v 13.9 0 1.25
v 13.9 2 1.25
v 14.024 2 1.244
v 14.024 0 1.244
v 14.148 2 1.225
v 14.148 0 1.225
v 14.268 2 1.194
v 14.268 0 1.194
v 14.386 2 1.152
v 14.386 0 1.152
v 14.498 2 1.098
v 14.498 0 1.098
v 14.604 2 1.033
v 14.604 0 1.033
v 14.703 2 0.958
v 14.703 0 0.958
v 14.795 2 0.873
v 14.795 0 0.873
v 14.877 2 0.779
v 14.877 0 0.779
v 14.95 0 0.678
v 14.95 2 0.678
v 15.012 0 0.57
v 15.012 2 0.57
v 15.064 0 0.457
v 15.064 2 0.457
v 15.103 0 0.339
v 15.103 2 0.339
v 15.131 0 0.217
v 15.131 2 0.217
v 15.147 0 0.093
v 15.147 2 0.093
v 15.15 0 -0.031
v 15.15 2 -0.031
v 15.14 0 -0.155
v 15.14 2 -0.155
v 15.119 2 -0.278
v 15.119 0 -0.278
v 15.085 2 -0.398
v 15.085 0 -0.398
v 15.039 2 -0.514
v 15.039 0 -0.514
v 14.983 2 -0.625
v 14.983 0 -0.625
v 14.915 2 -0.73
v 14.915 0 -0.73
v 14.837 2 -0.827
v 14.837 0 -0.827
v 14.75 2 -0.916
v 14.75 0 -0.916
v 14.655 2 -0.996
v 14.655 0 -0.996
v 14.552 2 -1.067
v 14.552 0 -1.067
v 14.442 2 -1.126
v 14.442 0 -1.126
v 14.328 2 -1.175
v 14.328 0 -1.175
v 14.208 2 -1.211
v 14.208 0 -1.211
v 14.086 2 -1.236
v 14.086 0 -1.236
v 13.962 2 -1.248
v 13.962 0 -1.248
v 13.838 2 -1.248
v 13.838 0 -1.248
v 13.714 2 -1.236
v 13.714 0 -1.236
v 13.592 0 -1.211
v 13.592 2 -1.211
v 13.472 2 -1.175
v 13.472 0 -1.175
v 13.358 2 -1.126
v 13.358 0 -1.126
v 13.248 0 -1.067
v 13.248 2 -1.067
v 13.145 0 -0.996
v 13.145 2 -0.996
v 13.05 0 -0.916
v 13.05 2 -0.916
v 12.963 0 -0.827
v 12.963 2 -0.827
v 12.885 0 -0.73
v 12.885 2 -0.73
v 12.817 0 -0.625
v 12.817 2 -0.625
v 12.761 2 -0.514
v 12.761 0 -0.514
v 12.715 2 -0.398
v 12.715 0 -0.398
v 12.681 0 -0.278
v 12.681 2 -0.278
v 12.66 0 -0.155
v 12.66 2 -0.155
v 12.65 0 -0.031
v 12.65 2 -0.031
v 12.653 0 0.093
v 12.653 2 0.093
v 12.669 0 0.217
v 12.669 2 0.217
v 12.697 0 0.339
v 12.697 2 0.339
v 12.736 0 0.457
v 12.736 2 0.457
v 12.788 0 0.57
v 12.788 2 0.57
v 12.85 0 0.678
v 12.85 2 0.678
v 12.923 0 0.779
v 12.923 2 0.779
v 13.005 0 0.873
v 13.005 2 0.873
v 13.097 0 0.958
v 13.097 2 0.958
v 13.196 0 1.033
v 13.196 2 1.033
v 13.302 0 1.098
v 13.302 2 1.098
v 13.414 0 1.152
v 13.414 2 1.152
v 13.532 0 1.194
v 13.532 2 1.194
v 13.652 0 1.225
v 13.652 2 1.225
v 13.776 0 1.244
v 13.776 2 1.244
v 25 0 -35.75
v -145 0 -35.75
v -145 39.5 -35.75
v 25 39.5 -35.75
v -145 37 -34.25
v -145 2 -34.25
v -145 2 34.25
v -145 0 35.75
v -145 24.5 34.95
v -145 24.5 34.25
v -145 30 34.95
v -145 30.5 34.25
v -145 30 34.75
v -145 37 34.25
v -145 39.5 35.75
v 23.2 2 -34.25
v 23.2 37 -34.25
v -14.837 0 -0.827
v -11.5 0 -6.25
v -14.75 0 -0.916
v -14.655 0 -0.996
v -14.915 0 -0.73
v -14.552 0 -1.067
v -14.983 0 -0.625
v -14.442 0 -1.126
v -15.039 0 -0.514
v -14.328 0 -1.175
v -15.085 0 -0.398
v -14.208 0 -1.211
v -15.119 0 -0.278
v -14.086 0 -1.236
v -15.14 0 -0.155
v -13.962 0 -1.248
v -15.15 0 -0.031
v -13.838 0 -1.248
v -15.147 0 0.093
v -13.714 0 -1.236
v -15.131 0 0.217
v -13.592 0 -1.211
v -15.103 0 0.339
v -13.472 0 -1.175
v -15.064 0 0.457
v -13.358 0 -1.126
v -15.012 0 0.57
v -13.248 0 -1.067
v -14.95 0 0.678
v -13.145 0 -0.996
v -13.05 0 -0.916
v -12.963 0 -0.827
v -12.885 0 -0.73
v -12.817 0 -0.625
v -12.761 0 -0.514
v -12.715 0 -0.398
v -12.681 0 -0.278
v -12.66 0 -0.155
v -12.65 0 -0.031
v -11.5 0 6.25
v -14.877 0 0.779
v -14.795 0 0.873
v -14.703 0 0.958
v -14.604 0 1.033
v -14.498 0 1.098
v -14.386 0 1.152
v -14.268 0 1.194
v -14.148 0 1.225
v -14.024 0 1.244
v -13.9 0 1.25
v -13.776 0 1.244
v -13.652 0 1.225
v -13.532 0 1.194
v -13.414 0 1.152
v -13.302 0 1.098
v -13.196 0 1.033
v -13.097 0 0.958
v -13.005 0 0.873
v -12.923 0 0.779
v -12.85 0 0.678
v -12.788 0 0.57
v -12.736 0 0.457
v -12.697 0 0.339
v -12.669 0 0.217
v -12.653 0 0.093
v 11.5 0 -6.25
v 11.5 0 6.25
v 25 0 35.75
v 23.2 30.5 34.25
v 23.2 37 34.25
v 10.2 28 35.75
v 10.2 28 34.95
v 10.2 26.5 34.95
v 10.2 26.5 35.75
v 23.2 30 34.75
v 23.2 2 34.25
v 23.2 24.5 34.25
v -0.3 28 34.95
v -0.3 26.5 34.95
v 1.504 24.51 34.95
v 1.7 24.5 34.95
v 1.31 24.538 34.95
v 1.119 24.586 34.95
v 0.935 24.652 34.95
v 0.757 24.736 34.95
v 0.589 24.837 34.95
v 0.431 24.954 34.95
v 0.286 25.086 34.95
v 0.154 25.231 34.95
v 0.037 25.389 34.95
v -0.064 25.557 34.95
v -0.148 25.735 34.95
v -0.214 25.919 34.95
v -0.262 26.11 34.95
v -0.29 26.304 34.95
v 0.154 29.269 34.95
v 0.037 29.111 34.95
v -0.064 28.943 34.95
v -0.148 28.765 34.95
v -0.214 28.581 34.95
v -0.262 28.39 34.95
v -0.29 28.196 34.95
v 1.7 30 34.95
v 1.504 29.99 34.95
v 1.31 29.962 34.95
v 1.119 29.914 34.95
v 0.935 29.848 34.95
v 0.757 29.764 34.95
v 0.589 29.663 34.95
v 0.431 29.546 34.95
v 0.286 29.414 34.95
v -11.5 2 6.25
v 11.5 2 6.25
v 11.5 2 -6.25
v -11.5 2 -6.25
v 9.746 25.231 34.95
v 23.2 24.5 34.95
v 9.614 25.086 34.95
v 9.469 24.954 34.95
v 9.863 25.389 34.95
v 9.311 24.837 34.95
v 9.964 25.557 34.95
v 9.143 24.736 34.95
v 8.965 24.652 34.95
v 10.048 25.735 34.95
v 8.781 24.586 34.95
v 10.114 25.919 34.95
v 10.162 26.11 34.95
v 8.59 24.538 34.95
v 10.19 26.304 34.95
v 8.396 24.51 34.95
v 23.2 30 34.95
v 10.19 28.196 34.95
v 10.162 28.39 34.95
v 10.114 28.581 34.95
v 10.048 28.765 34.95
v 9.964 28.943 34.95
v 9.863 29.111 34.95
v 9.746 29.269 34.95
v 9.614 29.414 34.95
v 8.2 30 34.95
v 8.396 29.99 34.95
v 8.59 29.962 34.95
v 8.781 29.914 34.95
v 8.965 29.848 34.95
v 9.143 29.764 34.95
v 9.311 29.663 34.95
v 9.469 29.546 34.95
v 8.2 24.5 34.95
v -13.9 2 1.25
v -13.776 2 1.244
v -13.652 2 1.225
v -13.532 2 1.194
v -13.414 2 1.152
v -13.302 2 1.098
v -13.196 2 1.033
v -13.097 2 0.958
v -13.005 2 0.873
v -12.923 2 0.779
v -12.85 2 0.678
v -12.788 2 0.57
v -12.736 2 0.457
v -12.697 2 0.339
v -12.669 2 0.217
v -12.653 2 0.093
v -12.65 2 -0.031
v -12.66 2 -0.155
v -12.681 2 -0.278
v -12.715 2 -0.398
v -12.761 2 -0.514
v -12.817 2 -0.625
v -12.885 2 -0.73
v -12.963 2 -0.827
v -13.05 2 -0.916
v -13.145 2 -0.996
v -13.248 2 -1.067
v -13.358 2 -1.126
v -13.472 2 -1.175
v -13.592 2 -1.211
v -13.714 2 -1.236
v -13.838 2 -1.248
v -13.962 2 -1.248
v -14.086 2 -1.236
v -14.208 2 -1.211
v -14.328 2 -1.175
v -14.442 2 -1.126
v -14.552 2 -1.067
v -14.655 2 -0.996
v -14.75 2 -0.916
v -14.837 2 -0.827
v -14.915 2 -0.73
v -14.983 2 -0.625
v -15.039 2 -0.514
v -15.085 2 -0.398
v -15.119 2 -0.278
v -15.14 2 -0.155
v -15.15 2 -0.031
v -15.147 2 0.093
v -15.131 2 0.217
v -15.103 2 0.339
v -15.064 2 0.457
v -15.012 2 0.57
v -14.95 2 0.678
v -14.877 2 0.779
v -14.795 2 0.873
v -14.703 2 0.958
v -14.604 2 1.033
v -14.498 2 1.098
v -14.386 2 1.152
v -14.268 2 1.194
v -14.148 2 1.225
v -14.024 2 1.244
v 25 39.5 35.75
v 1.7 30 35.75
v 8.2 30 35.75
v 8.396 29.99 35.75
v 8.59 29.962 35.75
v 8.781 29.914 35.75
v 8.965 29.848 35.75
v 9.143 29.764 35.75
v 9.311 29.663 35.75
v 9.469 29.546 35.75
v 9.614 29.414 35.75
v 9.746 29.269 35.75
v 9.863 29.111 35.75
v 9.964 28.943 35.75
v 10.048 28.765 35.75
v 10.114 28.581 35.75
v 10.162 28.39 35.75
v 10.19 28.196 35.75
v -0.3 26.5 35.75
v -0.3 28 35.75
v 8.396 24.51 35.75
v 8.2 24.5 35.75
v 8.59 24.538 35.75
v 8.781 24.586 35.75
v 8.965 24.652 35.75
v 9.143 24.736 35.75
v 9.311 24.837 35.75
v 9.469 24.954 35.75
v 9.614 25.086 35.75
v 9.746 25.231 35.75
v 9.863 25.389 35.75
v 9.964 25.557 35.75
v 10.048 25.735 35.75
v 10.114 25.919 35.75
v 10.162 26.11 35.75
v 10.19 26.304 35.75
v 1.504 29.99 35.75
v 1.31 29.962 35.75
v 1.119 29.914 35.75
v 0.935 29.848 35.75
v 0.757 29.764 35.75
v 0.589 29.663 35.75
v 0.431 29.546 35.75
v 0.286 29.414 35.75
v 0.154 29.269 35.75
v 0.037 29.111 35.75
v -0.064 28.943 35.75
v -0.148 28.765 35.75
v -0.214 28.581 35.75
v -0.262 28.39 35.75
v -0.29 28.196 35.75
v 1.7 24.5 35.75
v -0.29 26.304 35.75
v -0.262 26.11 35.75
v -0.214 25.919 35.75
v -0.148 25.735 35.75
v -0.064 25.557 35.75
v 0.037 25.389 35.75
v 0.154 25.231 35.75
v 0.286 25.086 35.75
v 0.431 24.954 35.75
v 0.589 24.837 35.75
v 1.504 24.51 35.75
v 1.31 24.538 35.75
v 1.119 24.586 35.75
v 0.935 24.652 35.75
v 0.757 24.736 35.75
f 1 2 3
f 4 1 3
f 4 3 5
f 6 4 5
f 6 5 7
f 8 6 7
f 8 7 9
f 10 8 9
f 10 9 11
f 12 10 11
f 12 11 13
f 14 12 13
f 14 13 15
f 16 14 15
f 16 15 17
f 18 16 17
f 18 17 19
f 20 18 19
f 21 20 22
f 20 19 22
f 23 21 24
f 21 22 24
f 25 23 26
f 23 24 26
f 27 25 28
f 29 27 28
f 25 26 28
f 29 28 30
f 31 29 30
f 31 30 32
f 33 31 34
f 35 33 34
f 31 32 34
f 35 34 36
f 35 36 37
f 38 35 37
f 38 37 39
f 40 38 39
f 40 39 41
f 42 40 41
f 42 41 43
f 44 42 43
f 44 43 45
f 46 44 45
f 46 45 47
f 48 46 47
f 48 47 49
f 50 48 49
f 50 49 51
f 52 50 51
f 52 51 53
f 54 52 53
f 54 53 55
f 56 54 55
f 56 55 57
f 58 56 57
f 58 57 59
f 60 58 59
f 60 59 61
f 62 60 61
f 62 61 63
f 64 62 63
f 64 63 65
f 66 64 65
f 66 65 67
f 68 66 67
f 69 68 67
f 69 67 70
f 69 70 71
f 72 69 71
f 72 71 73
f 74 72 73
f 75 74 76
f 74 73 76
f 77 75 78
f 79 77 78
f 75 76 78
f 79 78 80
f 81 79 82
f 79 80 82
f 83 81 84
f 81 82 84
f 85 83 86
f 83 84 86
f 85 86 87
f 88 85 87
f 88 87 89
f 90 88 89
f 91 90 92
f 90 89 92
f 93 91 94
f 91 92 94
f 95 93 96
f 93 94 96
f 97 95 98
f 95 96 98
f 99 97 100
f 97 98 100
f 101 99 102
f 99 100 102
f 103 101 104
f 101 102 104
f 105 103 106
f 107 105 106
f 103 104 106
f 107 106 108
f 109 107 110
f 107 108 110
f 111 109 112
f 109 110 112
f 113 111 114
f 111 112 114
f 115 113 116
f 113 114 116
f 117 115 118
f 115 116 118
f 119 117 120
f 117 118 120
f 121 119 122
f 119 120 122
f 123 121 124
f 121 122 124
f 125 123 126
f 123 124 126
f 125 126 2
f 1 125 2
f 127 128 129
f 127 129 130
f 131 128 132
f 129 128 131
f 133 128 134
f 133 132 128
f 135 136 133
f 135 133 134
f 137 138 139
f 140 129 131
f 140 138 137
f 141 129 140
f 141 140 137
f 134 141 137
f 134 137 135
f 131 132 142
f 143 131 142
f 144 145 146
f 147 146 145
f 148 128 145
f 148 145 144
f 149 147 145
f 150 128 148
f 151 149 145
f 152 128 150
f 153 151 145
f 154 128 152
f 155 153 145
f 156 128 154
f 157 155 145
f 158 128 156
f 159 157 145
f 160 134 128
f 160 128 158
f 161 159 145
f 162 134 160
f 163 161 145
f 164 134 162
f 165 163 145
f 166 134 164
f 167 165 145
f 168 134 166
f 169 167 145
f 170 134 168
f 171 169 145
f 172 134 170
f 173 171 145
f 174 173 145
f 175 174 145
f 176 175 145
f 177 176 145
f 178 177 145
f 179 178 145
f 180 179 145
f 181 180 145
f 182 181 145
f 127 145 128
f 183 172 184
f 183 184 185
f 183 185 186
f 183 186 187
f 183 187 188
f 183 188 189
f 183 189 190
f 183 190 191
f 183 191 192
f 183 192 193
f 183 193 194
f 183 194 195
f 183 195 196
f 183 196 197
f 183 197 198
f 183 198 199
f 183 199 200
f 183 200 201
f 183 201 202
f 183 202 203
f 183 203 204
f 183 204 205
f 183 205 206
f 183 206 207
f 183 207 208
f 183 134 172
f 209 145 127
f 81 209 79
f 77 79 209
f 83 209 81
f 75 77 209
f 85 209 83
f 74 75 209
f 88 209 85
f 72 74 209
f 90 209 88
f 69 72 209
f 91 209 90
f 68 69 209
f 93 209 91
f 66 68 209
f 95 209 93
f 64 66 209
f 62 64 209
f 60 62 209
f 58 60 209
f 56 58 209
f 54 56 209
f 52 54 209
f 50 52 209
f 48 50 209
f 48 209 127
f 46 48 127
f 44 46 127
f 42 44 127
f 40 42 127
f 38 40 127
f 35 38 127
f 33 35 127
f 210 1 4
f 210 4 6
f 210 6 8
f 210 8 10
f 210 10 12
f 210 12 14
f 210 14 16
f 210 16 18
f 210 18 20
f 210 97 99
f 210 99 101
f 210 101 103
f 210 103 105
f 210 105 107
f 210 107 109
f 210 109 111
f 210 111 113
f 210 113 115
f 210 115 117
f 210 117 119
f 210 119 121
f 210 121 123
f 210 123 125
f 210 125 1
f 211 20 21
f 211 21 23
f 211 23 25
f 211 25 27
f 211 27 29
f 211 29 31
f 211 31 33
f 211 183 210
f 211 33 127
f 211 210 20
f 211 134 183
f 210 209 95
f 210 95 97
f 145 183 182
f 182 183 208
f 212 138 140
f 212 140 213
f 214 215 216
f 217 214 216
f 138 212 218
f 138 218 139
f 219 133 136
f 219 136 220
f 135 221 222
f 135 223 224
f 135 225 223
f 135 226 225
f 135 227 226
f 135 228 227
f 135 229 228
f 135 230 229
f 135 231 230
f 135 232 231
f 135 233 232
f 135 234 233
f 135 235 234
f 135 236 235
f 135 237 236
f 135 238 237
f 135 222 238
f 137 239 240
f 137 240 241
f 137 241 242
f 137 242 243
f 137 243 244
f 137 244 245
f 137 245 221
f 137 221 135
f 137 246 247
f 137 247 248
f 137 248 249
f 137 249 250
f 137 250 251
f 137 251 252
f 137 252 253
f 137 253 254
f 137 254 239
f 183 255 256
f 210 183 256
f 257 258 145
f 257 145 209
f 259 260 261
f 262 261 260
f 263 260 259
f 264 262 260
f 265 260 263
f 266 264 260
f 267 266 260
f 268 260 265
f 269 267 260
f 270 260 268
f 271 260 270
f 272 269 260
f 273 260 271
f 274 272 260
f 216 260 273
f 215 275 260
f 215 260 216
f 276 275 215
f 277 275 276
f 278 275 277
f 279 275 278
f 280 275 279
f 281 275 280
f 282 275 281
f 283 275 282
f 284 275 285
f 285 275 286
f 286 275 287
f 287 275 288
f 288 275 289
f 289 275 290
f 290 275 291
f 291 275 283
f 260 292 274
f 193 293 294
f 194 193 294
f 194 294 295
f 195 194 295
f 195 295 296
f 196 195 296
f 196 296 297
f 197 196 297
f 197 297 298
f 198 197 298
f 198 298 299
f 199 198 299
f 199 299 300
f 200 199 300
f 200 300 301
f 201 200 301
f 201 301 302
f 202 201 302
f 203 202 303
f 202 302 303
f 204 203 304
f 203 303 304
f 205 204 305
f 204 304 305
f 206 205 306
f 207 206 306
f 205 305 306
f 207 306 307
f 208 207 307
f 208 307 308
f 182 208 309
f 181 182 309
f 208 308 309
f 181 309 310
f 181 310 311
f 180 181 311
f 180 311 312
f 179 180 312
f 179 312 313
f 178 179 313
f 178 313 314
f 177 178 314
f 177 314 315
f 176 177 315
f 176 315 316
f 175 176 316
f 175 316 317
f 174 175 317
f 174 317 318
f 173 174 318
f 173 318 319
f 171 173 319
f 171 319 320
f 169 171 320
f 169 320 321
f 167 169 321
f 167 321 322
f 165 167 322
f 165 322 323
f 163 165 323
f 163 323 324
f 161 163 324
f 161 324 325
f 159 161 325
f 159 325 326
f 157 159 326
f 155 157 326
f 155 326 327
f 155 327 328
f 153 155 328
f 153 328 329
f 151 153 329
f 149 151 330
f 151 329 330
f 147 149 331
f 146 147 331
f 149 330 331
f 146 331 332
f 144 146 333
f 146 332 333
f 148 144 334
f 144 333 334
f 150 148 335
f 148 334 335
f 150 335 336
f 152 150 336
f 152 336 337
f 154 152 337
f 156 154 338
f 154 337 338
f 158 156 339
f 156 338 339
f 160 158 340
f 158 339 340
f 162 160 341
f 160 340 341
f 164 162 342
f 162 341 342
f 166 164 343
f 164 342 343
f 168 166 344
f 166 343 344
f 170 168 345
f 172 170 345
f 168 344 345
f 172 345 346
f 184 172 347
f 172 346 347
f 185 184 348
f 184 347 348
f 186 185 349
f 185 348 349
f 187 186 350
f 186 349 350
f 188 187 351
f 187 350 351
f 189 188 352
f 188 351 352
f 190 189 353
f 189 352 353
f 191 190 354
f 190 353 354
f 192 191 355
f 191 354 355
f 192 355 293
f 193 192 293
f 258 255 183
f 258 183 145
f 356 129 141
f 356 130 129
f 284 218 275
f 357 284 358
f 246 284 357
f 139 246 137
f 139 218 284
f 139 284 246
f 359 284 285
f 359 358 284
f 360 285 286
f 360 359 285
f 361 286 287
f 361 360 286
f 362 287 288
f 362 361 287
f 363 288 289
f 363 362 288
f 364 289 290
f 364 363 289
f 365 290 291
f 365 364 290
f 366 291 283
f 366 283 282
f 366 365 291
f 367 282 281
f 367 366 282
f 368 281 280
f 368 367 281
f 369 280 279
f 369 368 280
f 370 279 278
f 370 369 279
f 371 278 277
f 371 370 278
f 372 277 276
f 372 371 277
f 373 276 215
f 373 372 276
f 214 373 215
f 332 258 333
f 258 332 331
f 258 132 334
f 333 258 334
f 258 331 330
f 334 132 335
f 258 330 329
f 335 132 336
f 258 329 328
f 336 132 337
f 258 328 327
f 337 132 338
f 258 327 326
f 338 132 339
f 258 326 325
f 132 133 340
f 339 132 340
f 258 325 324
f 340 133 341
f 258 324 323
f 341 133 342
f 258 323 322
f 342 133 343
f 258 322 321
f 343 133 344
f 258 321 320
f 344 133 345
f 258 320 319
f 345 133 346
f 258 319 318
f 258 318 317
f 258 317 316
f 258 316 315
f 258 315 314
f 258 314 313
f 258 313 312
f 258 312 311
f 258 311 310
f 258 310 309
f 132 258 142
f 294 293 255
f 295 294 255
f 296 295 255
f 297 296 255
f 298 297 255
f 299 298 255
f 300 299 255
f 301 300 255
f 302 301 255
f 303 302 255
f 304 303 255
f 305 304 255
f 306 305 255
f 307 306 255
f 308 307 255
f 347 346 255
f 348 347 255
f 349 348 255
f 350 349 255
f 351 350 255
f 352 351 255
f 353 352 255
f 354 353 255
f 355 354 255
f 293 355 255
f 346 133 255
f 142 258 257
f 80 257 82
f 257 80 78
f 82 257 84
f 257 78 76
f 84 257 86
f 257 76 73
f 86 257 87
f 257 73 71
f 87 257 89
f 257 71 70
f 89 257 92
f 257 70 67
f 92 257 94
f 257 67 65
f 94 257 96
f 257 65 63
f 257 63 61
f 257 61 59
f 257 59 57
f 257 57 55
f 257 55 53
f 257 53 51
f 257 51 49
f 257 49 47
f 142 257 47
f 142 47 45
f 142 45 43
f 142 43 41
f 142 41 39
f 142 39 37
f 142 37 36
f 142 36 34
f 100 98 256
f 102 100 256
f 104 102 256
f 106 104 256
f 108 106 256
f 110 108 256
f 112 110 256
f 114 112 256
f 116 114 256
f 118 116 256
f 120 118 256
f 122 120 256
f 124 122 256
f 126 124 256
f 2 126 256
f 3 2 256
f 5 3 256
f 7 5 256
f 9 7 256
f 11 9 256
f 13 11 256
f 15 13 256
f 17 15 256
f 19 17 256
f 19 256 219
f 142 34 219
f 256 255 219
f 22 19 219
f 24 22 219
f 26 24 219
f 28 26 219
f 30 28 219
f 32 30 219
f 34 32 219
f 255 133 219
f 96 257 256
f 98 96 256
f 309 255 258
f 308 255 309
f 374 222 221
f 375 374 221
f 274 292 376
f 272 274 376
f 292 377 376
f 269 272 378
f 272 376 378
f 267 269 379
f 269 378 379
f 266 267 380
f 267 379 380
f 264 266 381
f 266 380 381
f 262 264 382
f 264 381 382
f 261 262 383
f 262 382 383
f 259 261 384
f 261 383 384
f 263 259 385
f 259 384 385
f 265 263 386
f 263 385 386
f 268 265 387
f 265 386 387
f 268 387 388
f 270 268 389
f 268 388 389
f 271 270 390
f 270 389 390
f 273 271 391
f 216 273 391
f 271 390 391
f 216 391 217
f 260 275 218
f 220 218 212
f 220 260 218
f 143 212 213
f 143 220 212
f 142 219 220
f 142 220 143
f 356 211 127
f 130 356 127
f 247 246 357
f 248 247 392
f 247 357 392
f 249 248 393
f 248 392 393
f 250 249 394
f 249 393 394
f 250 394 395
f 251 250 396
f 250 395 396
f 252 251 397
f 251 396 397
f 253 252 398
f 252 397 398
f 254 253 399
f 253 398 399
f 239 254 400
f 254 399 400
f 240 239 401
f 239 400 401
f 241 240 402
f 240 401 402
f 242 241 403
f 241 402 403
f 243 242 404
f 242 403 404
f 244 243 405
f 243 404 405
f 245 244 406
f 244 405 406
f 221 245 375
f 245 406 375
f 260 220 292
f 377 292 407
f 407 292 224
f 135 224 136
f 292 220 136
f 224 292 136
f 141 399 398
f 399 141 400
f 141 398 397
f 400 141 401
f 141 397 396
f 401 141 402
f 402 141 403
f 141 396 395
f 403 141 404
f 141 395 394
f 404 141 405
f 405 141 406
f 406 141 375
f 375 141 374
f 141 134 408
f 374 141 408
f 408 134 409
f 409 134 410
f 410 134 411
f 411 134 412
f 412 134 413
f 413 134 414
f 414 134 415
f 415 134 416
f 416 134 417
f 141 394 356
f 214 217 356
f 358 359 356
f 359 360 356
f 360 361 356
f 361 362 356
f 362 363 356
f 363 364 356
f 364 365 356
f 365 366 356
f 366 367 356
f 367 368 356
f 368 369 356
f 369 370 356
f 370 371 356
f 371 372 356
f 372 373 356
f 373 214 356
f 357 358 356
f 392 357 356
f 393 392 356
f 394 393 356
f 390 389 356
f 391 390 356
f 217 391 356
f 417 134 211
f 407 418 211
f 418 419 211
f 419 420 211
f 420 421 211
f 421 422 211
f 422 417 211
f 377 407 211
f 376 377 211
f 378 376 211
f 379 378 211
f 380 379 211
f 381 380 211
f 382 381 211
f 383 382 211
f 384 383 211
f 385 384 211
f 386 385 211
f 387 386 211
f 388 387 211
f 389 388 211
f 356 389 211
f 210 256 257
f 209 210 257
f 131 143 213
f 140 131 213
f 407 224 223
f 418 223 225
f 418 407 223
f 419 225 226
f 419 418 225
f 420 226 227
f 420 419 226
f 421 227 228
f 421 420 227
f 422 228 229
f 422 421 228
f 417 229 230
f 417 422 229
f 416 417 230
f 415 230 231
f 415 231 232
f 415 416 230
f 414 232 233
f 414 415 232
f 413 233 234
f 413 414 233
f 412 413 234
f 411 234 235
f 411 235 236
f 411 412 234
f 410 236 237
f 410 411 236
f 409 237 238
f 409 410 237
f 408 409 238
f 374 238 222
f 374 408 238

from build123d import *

# Parameters (mm, degrees)
SKETCH1_W            = 50
SKETCH1_H            = 71.5
BOSS_EXTRUDE1_DEPTH  = 2
SKETCH2_W            = 23
SKETCH2_H            = 12.5
CUT_EXTRUDE1_DEPTH   = 3
SKETCH3_R            = 1.25
CUT_EXTRUDE2_DEPTH   = 3
SKETCH14_W           = 120
SKETCH14_H           = 71.5
BOSS_EXTRUDE7_DEPTH  = 2
SKETCH15_W           = 170
SKETCH15_H           = 1.5
BOSS_EXTRUDE8_DEPTH  = 37.5
SKETCH16_W           = 1.8
SKETCH16_H           = 68.5
BOSS_EXTRUDE9_DEPTH  = 37.5
SKETCH17_W           = 168.2
SKETCH17_H           = 5.5
CUT_EXTRUDE3_DEPTH   = 0.7
SKETCH18_W           = 10.5
SKETCH18_H           = 2.75
CUT_EXTRUDE4_DEPTH   = 1
FILLET4_R            = 2
SKETCH19_W           = 68.5
SKETCH19_H           = 2.5
BOSS_EXTRUDE10_DEPTH = 168.2
CHAMFER1_SIZE        = 0.5


with BuildPart() as part:
    # Sketch1 → Boss-Extrude1 (new body)
    with BuildSketch(Plane(origin=(0, 0, 0), x_dir=(1, 0, 0), z_dir=(0, 1, 0))):
        Rectangle(SKETCH1_W, SKETCH1_H)
    extrude(amount=BOSS_EXTRUDE1_DEPTH)

    # Sketch2 → Cut-Extrude1 (cut)
    with BuildSketch(Plane(origin=(0, 2, 0), x_dir=(1, 0, 0), z_dir=(0, 1, 0))):
        Rectangle(SKETCH2_W, SKETCH2_H)
    extrude(amount=-CUT_EXTRUDE1_DEPTH, mode=Mode.SUBTRACT)

    # Sketch3 → Cut-Extrude2 (cut)
    with BuildSketch(Plane(origin=(0, 2, 0), x_dir=(1, 0, 0), z_dir=(0, 1, 0))):
        with Locations(Location((-13.9, 0, 0), (0, 0, 270))):
            Circle(SKETCH3_R)
        with Locations(Location((13.9, 0, 0), (0, 0, 270))):
            Circle(SKETCH3_R)
    extrude(amount=-CUT_EXTRUDE2_DEPTH, mode=Mode.SUBTRACT)

    # Sketch14 → Boss-Extrude7 (add)
    with BuildSketch(Plane.XZ):
        with Locations((-85, 0)):
            Rectangle(SKETCH14_W, SKETCH14_H)
    extrude(amount=-BOSS_EXTRUDE7_DEPTH)

    # Sketch15 → Boss-Extrude8 (add)
    with BuildSketch(Plane(origin=(0, 2, 0), x_dir=(1, 0, 0), z_dir=(0, 1, 0))):
        with Locations((-60, -35)):
            Rectangle(SKETCH15_W, SKETCH15_H)
        with Locations((-60, 35)):
            Rectangle(SKETCH15_W, SKETCH15_H)
    extrude(amount=BOSS_EXTRUDE8_DEPTH)

    # Sketch16 → Boss-Extrude9 (add)
    with BuildSketch(Plane(origin=(0, 2, 0), x_dir=(1, 0, 0), z_dir=(0, 1, 0))):
        with Locations((24.1, 0)):
            Rectangle(SKETCH16_W, SKETCH16_H)
    extrude(amount=BOSS_EXTRUDE9_DEPTH)

    # Sketch17 → Cut-Extrude3 (cut)
    with BuildSketch(Plane(origin=(0, 0, 34.25), x_dir=(-1, 0, 0), z_dir=(0, 0, -1))):
        with Locations((60.9, 27.25)):
            Rectangle(SKETCH17_W, SKETCH17_H)
    extrude(amount=-CUT_EXTRUDE3_DEPTH, mode=Mode.SUBTRACT)

    # Sketch18 → Cut-Extrude4 (cut)
    with BuildSketch(Plane(origin=(0, 0, 34.95), x_dir=(-1, 0, 0), z_dir=(0, 0, -1))):
        with Locations((-4.95, 28.625)):
            Rectangle(SKETCH18_W, SKETCH18_H)
        with Locations((-4.95, 25.875)):
            Rectangle(SKETCH18_W, SKETCH18_H)
    extrude(amount=-CUT_EXTRUDE4_DEPTH, mode=Mode.SUBTRACT)

    # Fillet4
    fillet4_edges = [part.edges().sort_by_distance(p)[0] for p in [
        (10.2, 24.5, 35.35),
        (10.2, 30, 35.35),
        (-0.3, 30, 35.35),
        (-0.3, 24.5, 35.35),
    ]]
    fillet(fillet4_edges, radius=FILLET4_R)

    # Sketch19 → Boss-Extrude10 (add)
    with BuildSketch(Plane.ZY.offset(-23.2)):
        with Locations((0, 38.25)):
            Rectangle(SKETCH19_W, SKETCH19_H)
    extrude(amount=BOSS_EXTRUDE10_DEPTH)

    # Chamfer1
    chamfer1_edges = [part.edges().sort_by_distance(p)[0] for p in [
        (-60.9, 30, 34.25),
    ]]
    chamfer(chamfer1_edges, length=CHAMFER1_SIZE)


solid = part.part
